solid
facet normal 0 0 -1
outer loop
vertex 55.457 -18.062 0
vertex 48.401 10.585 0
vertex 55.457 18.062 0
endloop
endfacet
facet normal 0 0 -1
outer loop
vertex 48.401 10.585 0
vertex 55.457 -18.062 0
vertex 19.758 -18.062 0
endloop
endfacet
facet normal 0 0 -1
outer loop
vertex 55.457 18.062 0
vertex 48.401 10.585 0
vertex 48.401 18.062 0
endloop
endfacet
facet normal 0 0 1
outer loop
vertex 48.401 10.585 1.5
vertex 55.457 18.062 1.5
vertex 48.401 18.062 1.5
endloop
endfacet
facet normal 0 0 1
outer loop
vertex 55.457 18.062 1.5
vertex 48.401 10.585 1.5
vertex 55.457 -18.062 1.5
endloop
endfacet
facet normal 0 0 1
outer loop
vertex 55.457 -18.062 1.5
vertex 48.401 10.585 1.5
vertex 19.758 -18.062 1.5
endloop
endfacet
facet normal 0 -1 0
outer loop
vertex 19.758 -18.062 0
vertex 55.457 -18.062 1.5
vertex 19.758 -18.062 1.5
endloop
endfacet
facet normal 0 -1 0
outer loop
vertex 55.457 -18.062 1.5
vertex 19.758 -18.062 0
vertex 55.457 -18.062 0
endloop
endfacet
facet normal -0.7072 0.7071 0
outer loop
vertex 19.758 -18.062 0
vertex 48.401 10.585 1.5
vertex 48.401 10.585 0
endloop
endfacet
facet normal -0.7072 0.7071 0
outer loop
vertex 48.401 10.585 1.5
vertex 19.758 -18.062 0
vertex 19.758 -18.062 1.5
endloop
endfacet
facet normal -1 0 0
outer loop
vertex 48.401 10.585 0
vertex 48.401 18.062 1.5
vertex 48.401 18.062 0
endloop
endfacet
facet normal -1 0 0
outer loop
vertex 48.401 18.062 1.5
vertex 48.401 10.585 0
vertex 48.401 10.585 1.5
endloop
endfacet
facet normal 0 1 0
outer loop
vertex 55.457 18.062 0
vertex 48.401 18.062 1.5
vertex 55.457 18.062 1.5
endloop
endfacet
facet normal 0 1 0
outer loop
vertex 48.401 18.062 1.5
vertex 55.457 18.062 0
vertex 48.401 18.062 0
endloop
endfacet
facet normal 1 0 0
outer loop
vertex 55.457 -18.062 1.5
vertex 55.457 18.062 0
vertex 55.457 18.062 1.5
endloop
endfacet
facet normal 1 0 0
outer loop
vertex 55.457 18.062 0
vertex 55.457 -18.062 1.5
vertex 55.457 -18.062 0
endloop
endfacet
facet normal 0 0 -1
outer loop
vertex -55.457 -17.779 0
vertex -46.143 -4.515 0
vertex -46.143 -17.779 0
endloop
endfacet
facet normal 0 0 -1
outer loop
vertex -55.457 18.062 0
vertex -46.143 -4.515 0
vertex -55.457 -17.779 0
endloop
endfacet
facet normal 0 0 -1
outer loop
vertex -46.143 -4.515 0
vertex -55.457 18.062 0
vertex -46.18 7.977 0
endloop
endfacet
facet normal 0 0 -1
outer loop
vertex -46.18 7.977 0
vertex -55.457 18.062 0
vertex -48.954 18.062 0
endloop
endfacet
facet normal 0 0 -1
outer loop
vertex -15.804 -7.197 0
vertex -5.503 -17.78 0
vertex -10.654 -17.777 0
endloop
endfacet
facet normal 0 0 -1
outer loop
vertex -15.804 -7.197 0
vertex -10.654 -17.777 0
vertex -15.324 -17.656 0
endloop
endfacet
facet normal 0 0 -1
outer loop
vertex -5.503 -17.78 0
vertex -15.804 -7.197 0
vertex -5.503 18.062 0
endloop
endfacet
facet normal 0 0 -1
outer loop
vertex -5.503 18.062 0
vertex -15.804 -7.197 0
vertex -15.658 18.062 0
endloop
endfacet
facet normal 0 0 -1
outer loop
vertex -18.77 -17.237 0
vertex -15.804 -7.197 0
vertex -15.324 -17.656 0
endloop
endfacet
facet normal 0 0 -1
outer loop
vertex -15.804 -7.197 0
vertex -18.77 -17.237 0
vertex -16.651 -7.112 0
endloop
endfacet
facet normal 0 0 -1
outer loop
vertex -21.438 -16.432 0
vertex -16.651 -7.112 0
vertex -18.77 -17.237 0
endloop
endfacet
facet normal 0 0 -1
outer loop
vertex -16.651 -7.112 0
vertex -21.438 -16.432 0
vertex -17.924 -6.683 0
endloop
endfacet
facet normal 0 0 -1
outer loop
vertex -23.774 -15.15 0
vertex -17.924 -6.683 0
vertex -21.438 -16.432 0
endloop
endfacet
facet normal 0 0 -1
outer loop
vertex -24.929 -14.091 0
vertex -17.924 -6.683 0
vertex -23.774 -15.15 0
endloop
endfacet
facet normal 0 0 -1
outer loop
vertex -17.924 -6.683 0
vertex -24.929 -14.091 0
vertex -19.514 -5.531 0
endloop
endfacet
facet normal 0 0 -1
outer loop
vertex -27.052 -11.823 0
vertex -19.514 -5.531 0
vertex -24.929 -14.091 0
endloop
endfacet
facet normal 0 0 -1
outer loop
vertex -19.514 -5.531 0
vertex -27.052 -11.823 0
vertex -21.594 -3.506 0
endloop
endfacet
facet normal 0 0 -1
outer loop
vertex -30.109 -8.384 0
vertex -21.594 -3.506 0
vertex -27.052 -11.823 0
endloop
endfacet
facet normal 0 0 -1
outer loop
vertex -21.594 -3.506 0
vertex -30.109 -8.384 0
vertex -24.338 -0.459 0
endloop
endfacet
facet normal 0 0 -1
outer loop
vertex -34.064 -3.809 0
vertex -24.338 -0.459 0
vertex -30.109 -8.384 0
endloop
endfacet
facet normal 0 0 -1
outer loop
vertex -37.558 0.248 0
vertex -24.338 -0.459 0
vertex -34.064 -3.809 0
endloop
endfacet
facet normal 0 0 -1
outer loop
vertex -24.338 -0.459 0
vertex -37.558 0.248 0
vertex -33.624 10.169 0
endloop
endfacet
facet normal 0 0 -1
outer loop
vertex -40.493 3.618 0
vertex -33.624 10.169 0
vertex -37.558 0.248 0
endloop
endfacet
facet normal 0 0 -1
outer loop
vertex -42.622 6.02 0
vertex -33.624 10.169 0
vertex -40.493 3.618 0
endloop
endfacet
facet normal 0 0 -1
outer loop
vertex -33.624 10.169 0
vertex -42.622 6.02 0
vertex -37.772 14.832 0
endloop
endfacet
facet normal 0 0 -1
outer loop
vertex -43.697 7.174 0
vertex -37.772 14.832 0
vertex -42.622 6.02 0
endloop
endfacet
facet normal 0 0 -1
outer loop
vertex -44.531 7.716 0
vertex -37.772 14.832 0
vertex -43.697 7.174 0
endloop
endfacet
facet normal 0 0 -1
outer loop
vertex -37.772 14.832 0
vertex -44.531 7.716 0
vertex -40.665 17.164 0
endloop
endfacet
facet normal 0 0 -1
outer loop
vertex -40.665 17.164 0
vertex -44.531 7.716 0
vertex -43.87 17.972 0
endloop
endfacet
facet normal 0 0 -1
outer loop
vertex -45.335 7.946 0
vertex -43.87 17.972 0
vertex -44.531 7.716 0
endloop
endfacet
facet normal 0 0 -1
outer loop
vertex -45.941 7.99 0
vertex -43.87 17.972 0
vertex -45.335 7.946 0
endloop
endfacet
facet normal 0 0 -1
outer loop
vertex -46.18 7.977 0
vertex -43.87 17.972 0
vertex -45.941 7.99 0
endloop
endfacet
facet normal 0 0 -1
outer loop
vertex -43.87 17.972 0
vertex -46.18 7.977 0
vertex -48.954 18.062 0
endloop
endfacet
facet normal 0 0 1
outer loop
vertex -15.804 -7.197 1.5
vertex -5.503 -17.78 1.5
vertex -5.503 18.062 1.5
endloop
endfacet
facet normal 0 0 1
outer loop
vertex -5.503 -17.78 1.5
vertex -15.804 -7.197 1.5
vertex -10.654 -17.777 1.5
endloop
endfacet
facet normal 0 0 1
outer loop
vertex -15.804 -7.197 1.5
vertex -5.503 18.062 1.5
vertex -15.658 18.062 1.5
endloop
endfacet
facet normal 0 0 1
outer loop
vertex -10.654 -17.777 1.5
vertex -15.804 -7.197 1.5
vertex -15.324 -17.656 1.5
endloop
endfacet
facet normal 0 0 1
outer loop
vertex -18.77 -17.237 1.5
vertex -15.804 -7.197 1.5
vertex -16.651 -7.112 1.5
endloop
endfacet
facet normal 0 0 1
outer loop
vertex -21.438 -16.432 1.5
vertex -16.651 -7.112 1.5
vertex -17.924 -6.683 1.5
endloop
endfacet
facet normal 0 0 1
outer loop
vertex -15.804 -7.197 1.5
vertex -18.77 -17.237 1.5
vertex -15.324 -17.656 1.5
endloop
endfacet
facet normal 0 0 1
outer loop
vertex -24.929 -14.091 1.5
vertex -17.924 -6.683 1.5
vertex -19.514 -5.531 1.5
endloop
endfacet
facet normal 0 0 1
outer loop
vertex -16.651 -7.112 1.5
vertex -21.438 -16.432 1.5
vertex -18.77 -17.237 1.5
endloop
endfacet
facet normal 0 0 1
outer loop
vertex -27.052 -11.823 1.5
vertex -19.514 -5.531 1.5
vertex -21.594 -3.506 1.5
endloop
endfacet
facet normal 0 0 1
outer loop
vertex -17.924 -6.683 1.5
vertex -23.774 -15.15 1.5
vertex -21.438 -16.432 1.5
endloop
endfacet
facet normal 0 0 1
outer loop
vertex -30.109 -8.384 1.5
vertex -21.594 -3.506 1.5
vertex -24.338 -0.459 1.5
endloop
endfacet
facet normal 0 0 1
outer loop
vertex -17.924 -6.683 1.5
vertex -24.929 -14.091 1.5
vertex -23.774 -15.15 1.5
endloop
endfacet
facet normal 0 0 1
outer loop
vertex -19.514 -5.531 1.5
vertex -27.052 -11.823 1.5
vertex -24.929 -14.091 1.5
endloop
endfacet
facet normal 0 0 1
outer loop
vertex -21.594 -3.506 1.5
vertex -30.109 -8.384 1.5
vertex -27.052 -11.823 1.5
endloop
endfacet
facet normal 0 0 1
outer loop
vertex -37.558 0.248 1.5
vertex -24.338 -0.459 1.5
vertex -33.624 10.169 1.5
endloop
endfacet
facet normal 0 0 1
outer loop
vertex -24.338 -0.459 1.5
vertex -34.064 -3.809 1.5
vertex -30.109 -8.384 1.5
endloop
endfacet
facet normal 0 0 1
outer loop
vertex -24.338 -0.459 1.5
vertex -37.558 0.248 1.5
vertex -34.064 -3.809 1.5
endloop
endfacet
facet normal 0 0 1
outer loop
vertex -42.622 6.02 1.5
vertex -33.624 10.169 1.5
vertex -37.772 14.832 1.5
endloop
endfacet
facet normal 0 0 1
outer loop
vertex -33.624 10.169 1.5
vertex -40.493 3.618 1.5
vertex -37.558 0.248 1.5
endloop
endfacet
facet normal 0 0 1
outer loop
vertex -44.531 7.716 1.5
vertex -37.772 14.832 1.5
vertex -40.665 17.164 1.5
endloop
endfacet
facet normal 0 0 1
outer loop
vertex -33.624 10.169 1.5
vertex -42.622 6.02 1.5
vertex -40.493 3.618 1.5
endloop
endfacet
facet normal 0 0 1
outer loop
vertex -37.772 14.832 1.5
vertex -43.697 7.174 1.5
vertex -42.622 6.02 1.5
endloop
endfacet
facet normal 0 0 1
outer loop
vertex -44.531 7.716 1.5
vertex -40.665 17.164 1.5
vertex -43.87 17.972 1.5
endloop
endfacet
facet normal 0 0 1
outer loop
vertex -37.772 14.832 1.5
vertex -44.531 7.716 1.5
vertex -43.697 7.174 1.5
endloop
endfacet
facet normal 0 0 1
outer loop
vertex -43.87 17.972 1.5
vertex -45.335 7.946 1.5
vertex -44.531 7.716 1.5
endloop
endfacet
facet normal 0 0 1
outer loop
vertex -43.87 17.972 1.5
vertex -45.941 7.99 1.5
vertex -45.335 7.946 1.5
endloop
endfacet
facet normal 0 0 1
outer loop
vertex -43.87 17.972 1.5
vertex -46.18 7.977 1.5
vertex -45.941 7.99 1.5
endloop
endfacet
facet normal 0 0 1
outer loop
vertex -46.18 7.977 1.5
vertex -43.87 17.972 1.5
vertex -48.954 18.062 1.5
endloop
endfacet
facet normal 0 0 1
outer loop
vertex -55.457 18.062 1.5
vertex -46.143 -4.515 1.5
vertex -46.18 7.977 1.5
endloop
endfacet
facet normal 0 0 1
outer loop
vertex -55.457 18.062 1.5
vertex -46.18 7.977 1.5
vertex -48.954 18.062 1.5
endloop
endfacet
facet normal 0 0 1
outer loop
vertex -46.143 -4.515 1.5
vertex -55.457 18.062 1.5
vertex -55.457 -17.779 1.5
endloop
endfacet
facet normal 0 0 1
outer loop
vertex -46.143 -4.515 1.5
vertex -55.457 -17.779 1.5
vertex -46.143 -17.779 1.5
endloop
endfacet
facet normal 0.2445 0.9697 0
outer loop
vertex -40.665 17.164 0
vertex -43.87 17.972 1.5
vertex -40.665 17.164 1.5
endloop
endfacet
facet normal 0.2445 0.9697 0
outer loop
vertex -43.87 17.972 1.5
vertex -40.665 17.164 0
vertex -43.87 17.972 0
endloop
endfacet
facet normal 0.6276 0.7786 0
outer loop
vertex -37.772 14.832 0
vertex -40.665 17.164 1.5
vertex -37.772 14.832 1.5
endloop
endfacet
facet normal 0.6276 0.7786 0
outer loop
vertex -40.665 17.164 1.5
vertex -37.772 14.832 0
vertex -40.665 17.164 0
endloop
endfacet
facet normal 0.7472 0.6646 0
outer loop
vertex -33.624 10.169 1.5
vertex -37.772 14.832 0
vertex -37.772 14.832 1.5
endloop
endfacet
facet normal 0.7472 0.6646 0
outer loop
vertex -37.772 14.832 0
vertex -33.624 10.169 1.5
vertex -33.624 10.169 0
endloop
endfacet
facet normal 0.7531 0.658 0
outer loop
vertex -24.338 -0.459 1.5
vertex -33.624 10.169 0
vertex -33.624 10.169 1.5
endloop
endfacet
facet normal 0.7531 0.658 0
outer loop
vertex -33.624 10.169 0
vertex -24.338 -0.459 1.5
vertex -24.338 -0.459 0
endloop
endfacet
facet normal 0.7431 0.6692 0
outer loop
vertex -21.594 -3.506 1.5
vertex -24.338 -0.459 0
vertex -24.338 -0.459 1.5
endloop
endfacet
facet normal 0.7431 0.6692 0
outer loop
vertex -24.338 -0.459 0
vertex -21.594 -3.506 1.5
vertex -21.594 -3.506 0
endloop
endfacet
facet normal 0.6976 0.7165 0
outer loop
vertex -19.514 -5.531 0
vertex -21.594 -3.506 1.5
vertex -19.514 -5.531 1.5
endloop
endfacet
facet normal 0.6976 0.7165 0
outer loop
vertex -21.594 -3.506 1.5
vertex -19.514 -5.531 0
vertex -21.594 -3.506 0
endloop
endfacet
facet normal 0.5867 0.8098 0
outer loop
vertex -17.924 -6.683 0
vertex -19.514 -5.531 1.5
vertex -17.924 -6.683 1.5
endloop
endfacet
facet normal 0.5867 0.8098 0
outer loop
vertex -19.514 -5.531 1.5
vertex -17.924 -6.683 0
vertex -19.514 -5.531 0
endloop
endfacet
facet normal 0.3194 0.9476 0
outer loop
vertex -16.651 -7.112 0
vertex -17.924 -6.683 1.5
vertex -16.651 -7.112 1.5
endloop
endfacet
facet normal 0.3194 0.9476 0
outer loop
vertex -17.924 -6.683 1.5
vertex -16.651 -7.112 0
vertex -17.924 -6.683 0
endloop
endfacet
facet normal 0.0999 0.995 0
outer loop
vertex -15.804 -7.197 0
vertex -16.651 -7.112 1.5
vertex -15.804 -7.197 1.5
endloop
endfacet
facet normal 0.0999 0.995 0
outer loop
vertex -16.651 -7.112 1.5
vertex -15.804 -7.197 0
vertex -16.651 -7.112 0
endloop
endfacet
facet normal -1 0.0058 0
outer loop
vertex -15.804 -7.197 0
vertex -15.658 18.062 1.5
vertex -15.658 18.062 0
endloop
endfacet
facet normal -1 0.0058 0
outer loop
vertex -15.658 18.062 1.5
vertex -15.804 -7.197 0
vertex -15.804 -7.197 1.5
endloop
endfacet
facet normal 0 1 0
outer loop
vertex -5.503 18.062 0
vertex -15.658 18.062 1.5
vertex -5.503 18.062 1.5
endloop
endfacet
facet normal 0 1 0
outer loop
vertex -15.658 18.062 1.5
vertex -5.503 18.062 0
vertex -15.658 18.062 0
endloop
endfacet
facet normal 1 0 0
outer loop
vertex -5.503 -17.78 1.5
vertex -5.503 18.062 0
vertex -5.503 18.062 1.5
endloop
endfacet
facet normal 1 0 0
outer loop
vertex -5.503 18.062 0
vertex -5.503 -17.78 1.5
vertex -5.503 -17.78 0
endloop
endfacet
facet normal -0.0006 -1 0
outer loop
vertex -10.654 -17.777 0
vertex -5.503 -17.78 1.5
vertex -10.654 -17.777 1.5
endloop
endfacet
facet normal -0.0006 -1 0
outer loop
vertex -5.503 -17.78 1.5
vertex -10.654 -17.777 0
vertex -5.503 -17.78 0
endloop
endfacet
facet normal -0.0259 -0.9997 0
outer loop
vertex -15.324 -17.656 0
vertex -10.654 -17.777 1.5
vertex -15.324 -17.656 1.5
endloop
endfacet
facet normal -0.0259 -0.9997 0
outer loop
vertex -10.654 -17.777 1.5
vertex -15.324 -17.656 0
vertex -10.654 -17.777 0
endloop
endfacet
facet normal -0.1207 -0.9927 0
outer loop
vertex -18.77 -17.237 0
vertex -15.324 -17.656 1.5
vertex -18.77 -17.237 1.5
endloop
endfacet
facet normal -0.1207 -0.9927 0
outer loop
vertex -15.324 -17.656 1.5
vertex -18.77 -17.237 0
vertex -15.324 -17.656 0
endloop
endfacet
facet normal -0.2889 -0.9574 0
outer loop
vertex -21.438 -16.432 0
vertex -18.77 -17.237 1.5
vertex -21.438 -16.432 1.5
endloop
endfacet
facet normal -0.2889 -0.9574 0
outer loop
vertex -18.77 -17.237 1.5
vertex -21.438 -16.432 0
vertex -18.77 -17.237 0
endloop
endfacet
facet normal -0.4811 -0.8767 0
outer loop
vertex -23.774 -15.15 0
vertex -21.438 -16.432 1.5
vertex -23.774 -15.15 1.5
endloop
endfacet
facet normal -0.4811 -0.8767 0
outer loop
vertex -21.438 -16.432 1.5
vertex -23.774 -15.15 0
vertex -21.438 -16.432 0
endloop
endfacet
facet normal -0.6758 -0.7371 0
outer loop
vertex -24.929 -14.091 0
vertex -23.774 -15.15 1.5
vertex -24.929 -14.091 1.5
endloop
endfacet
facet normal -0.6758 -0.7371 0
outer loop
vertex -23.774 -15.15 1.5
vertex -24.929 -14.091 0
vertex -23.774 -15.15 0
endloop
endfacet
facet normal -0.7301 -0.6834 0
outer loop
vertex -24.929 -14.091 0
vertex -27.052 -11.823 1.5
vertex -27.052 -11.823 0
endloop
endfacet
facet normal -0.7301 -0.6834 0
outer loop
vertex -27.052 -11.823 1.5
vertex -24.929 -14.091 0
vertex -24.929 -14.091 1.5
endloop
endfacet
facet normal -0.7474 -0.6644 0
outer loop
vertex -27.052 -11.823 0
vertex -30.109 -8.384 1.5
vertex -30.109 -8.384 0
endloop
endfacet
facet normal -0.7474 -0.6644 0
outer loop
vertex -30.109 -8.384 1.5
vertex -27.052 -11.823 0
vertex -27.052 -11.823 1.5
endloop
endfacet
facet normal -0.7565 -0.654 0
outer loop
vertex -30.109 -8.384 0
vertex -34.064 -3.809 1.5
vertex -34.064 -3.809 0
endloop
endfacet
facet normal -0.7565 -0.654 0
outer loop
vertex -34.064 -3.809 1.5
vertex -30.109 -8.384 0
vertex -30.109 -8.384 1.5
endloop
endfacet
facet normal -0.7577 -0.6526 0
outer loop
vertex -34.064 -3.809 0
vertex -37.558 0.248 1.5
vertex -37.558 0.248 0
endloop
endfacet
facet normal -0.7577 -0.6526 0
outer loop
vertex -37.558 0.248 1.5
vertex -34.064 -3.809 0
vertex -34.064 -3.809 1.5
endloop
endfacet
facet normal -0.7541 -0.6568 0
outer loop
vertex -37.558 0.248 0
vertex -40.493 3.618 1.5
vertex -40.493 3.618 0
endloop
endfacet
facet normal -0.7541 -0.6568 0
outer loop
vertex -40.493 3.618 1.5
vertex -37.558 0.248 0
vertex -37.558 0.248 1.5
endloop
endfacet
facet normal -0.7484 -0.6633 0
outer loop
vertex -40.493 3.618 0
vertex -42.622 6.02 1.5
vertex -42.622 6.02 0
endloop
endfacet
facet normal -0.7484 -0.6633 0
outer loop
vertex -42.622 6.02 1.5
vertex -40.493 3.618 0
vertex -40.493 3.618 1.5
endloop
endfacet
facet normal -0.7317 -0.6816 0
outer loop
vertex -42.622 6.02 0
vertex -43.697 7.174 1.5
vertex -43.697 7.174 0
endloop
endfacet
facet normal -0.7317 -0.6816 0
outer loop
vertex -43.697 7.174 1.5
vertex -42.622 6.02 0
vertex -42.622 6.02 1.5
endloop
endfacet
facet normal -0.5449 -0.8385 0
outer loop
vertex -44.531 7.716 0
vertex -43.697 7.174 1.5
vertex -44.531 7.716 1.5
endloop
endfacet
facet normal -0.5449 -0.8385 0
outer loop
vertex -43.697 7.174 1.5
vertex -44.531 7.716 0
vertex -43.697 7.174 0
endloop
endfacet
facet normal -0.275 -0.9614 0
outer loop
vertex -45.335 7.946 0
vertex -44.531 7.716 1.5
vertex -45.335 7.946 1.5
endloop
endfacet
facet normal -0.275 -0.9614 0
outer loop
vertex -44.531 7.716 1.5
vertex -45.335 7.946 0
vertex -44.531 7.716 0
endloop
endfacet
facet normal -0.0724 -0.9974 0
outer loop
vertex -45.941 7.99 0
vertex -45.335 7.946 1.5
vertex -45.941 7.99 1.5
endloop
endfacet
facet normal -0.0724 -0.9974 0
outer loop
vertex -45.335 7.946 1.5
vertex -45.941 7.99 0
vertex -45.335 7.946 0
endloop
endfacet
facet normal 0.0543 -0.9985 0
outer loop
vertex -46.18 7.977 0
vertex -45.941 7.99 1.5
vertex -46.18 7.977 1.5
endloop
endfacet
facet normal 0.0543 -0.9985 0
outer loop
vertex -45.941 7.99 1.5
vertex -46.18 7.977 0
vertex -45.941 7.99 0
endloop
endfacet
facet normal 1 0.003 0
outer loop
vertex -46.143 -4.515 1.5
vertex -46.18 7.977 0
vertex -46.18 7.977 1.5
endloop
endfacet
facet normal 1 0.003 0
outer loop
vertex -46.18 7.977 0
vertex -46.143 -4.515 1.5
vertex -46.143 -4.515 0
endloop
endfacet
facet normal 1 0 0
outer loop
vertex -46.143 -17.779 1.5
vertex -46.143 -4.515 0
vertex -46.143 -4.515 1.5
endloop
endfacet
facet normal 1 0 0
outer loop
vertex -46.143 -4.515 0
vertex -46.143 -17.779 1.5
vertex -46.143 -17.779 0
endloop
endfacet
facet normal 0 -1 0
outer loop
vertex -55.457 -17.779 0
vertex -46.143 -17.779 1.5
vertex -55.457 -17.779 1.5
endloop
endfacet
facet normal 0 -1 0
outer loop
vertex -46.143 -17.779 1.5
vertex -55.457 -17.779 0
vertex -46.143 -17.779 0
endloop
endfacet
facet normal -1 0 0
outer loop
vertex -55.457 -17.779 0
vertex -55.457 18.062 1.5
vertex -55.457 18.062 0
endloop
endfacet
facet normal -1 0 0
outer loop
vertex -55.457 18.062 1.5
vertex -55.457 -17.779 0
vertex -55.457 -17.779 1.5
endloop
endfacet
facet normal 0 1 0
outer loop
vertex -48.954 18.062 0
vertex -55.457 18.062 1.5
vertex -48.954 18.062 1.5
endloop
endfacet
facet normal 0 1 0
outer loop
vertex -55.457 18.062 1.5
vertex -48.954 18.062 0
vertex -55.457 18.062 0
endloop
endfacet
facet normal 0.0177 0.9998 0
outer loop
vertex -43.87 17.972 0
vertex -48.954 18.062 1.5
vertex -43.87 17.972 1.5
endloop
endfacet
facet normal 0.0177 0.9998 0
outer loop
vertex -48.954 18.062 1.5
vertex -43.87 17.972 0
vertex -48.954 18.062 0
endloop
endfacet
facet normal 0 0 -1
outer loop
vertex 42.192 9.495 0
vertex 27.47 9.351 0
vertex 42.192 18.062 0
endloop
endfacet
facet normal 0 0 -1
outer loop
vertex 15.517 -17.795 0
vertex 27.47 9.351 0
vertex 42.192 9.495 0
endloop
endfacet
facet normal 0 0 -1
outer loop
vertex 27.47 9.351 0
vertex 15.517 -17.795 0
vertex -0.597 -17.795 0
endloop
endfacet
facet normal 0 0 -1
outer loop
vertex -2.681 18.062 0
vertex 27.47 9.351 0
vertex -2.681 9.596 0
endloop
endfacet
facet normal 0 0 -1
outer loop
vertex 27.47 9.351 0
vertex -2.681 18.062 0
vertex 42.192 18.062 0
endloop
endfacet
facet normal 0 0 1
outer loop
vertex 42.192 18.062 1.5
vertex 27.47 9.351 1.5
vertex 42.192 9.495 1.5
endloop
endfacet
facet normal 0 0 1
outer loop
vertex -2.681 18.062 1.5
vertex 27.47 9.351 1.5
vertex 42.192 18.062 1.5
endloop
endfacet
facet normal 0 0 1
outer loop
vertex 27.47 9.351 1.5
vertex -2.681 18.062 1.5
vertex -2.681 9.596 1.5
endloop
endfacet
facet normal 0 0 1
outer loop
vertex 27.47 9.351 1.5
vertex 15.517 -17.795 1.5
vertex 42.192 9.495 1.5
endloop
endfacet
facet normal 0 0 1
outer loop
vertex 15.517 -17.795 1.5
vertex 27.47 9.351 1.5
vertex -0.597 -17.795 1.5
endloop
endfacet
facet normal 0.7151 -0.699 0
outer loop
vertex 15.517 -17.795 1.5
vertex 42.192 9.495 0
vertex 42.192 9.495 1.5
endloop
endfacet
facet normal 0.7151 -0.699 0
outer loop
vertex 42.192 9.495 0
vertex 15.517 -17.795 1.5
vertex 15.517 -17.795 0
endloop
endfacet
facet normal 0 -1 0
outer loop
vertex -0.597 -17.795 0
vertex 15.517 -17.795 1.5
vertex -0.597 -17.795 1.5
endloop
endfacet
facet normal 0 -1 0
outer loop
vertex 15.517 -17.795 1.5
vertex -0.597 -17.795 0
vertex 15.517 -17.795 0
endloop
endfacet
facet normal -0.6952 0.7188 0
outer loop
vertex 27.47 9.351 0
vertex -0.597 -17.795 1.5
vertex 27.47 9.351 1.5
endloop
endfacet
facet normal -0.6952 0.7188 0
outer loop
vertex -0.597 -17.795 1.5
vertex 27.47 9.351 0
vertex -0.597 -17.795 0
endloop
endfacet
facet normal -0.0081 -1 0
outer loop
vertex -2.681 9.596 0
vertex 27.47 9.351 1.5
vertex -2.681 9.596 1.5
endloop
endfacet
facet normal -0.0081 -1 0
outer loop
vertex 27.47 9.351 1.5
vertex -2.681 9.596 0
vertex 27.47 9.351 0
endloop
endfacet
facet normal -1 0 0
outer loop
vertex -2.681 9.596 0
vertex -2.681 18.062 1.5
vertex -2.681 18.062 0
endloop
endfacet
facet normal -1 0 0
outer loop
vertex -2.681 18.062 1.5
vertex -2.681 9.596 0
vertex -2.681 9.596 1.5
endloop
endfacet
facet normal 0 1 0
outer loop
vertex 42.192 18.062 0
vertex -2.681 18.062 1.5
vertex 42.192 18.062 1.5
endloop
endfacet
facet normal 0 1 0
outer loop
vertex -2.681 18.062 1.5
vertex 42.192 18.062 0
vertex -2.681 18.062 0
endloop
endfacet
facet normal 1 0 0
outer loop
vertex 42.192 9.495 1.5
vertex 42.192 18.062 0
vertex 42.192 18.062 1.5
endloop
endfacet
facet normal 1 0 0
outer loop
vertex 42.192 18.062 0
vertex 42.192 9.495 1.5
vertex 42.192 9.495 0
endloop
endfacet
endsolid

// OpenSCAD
// Module names are of the form poly_<inkscape-path-id>().  As a result,
// you can associate a polygon in this OpenSCAD program with the corresponding
// SVG element in the Inkscape document by looking for the XML element with
// the attribute id="inkscape-path-id".

// fudge value is used to ensure that subtracted solids are a tad taller
// in the z dimension than the polygon being subtracted from.  This helps
// keep the resulting .stl file manifold.
fudge = 0.1;

module n7_logo(h)
{
  scale([25.4/90, -25.4/90, 1]) union()
  {
    linear_extrude(height=h)
      polygon([[120.753685,13.246345],[171.500005,-37.507295],[171.500005,-50.753655],[171.500005,-64.000015],[184.000005,-64.000015],[196.500005,-64.000015],[196.500005,-0.000015],[196.500005,64.000015],[133.253685,64.000015],[70.007355,64.000015]]);
    linear_extrude(height=h)
      polygon([[-196.500005,-64.000015],[-173.460165,-64.000015],[-155.446595,-63.680905],[-144.088875,-60.818395],[-133.836395,-52.554695],[-119.138555,-36.032025],[-110.913205,-26.617345],[-102.687845,-17.202675],[-94.462495,-7.787995],[-86.237135,1.626685],[-76.515165,12.422935],[-69.143785,19.596595],[-63.509795,23.678335],[-58.999995,25.198845],[-58.249995,25.274145],[-57.499995,25.349445],[-56.749995,25.424745],[-55.999995,25.500045],[-55.479405,-63.999955],[-19.499995,-63.999955],[-19.499995,63.000075],[-37.749995,62.990075],[-54.298835,62.560535],[-66.508095,61.077075],[-75.960195,58.222695],[-84.237615,53.680375],[-88.331355,49.930105],[-95.853805,41.893975],[-106.683895,29.705465],[-120.700545,13.498045],[-133.079125,-0.878185],[-143.478025,-12.819315],[-151.021415,-21.331545],[-154.833455,-25.421055],[-157.786965,-27.341435],[-160.635675,-28.154455],[-162.782645,-28.311365],[-163.630955,-28.263365],[-163.499995,15.998075],[-163.499995,62.998105],[-196.500005,62.998105]]);
    linear_extrude(height=h)
      polygon([[97.333335,-33.133325],[-9.499995,-34.000015],[-9.499995,-64.000015],[149.500005,-64.000015],[149.500005,-33.644055],[54.982745,63.053585],[-2.116535,63.053585]]);
  }
}

n7_logo(1.5);
